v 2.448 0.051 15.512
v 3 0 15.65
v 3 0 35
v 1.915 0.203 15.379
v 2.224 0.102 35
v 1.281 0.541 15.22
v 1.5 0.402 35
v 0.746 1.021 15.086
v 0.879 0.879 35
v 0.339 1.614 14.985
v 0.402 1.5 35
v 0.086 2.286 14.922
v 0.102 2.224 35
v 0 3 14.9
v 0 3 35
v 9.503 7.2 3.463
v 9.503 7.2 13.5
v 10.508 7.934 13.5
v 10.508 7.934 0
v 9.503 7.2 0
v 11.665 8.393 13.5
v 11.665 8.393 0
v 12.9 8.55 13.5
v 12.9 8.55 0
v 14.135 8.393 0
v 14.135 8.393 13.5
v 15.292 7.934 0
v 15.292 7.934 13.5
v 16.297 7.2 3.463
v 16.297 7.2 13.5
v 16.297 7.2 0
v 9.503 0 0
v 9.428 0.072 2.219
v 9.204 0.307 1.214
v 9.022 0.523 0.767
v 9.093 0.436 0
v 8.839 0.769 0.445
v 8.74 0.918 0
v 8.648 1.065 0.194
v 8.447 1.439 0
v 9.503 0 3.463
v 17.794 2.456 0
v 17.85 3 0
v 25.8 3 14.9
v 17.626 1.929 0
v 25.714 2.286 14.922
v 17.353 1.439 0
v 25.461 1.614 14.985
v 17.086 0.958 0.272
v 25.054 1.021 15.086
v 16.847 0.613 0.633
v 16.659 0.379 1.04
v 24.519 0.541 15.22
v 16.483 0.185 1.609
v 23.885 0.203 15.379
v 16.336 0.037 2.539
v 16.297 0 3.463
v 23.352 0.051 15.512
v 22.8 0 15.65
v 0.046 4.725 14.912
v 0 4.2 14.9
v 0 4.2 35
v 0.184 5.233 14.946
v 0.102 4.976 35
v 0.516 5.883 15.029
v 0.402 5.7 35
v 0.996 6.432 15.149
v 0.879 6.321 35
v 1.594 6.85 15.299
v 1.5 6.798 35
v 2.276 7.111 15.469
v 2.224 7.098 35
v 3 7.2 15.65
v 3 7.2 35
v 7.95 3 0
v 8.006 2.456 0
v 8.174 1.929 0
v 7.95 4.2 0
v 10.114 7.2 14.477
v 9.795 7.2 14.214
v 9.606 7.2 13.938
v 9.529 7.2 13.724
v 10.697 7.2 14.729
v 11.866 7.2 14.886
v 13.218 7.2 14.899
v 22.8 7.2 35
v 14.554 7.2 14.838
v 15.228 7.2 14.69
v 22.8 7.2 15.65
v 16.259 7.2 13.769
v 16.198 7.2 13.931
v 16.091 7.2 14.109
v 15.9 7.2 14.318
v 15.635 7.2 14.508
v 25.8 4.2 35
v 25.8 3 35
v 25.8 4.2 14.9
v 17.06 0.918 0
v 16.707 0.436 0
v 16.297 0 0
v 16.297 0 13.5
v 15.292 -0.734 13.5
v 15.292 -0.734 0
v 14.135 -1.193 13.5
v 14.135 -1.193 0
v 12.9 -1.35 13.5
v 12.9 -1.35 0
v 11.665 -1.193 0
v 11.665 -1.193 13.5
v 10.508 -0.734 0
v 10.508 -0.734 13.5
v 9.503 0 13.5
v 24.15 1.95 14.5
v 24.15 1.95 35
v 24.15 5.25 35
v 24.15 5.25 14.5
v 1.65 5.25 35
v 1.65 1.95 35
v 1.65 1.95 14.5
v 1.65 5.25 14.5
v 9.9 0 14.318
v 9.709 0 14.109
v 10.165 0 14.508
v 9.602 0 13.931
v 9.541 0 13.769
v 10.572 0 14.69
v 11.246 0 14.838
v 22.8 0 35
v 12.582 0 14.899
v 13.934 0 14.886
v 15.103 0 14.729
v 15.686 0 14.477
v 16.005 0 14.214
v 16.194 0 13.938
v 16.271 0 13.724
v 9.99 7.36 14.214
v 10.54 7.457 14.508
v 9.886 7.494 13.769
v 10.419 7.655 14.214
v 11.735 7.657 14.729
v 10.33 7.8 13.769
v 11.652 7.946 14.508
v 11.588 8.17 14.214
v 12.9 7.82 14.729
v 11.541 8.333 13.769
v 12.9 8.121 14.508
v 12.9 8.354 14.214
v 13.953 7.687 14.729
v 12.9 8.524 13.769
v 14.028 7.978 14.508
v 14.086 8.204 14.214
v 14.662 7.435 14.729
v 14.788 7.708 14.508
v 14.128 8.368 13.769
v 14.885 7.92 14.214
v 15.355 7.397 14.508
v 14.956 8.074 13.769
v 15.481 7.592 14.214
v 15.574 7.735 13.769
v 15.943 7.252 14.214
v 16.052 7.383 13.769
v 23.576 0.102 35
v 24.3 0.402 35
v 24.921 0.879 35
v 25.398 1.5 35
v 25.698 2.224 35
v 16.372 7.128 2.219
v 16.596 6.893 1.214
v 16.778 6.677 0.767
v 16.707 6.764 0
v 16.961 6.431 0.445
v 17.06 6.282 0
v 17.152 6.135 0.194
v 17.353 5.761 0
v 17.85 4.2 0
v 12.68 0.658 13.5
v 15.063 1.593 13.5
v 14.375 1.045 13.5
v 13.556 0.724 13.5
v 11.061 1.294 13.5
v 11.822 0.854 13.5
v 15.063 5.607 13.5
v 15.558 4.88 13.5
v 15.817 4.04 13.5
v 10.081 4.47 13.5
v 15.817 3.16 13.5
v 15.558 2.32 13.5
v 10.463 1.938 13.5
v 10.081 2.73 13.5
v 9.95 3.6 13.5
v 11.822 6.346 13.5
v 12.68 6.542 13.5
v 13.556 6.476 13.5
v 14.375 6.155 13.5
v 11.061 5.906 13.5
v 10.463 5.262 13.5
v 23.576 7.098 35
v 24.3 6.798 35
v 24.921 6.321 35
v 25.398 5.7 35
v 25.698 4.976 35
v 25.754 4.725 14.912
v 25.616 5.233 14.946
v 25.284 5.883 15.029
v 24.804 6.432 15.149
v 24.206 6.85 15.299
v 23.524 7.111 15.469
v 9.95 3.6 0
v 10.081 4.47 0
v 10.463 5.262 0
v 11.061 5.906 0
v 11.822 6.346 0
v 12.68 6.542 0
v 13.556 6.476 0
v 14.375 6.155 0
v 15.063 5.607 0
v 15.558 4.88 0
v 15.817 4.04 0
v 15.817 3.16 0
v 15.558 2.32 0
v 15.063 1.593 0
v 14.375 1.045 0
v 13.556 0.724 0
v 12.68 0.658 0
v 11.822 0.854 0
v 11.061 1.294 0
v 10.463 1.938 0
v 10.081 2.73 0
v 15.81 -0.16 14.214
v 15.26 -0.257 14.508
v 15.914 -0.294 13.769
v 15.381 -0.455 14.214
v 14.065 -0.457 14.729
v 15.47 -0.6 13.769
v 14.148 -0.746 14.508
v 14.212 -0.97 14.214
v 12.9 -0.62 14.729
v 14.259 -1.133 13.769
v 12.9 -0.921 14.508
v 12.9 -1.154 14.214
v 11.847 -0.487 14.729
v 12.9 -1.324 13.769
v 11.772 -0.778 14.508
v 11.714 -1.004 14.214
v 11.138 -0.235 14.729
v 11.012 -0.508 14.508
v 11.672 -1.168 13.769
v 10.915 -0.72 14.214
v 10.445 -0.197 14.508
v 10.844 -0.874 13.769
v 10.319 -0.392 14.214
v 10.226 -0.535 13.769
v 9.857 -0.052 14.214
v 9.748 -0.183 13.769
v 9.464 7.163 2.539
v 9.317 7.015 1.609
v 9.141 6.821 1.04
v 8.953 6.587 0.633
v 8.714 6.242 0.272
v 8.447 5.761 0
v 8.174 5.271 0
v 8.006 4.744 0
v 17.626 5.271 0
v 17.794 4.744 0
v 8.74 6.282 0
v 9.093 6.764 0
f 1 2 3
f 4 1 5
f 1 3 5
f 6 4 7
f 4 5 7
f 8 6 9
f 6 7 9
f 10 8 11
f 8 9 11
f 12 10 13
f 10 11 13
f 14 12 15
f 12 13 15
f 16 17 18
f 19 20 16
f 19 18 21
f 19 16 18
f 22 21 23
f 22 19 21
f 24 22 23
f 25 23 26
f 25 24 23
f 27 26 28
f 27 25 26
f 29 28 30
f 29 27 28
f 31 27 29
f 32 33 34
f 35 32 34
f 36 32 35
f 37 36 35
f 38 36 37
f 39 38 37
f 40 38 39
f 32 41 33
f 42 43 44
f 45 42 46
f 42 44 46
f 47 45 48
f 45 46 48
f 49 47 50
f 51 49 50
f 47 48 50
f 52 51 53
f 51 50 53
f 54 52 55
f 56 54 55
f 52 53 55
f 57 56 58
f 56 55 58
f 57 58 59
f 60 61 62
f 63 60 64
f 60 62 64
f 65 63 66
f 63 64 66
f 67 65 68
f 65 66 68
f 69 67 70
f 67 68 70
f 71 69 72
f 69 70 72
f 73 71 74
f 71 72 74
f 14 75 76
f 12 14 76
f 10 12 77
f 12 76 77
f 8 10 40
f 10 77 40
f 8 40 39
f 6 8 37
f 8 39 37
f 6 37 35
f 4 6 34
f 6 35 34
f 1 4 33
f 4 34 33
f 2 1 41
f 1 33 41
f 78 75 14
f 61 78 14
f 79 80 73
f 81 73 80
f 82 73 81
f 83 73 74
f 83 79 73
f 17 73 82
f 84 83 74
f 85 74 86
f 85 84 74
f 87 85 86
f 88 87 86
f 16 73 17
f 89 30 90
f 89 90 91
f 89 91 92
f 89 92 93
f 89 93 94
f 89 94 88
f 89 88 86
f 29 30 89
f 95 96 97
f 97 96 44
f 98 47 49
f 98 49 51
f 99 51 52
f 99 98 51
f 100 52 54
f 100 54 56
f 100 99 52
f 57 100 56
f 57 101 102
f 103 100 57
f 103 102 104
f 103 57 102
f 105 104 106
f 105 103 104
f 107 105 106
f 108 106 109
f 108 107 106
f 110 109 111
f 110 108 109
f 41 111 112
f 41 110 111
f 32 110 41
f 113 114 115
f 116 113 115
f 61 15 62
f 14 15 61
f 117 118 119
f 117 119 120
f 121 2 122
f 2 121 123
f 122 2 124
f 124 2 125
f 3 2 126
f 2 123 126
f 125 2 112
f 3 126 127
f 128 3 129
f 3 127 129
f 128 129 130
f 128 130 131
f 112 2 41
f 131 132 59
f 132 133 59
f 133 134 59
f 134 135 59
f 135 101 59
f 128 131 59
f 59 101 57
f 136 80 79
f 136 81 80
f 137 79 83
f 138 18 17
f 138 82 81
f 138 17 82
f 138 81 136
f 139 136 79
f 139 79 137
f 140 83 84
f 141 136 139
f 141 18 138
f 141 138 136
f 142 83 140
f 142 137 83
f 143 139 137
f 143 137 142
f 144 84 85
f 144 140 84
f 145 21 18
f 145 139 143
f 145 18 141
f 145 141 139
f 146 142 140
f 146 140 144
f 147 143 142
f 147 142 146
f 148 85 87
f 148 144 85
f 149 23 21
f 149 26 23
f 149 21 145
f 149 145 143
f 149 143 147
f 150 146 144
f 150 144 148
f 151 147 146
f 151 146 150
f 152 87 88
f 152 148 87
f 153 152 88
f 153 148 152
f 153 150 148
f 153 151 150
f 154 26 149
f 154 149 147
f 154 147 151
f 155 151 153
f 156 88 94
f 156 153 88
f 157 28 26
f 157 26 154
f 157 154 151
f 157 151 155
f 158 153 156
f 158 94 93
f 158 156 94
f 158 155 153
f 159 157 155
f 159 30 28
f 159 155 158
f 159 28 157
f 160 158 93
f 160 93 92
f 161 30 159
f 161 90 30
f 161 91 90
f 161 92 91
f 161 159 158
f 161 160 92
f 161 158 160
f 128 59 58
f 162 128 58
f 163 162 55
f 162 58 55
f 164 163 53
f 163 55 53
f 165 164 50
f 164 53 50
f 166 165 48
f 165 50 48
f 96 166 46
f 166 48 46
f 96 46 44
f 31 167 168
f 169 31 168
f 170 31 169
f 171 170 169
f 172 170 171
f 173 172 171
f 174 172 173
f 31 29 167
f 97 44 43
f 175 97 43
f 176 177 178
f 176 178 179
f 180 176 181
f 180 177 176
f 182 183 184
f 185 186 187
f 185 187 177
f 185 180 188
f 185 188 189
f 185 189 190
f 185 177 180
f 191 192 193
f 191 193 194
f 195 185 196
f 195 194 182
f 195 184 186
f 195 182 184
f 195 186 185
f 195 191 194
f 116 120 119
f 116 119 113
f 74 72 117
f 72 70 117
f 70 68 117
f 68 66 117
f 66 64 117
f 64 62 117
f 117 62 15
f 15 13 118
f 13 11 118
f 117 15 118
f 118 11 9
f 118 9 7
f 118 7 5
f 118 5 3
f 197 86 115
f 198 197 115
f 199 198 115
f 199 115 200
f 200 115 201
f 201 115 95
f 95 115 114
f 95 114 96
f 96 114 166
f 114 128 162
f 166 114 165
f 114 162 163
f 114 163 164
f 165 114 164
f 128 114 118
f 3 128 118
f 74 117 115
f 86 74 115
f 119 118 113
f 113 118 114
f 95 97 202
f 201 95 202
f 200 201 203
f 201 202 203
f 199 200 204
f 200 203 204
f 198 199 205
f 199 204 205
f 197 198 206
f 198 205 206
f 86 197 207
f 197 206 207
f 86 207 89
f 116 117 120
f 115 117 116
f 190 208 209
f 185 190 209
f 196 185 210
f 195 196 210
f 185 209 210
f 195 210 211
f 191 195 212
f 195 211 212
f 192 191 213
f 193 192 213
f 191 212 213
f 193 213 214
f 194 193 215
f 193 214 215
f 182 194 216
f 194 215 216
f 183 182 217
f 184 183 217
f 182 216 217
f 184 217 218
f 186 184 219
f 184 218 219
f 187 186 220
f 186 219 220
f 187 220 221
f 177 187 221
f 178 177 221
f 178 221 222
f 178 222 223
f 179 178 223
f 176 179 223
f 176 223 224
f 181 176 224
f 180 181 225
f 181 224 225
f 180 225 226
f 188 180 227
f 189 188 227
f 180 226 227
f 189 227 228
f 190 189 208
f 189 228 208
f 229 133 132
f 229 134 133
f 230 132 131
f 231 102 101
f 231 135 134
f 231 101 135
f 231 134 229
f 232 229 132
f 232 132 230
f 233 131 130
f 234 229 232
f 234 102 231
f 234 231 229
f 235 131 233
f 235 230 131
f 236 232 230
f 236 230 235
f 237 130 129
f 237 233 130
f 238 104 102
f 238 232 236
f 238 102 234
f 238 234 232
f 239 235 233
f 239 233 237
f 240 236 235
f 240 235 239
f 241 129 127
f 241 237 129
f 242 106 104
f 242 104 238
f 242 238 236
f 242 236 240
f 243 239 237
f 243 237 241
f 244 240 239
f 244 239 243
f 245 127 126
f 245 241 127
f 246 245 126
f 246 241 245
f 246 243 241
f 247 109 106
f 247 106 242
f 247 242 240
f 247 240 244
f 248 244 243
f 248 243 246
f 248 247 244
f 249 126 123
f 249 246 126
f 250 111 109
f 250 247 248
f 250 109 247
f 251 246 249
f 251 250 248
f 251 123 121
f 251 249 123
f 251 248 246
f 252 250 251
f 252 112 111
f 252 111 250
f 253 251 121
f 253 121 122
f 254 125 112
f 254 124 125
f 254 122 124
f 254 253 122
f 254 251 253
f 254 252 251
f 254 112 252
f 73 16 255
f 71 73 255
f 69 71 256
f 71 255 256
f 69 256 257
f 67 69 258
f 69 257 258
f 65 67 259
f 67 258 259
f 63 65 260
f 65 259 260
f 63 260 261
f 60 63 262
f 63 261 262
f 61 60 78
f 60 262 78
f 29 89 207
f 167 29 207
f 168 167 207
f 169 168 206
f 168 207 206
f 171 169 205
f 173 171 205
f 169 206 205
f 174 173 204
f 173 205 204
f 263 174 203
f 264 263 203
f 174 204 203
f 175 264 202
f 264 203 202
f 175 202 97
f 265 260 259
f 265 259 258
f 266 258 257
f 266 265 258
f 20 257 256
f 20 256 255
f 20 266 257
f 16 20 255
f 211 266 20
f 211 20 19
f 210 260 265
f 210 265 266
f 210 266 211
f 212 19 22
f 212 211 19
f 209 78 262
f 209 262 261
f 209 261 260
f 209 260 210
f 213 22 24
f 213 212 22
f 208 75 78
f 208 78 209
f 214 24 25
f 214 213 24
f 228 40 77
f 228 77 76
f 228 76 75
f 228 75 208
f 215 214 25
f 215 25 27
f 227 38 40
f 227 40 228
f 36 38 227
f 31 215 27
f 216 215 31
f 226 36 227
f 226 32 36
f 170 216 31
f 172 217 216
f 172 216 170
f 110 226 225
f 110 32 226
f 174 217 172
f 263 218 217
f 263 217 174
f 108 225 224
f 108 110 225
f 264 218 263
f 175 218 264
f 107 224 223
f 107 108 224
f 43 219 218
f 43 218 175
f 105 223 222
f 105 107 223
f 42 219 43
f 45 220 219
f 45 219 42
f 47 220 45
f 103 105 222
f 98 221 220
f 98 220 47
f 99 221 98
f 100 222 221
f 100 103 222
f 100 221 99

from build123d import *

# Parameters (mm, degrees)
SKETCH1_W           = 25.8
SKETCH1_H           = 35
BOSS_EXTRUDE1_DEPTH = 7.2
SKETCH3_W           = 22.5
SKETCH3_H           = 3.3
CUT_EXTRUDE1_DEPTH  = 20.5
BOSS_EXTRUDE2_DEPTH = 14.9
SKETCH6_R           = 2.95
CUT_EXTRUDE3_DEPTH  = 13.5
FILLET1_R           = 1.4
FILLET2_R           = 1.4
CUT_EXTRUDE4_DEPTH  = 13.5
FILLET5_R           = 3


with BuildPart() as part:
    # Sketch1 → Boss-Extrude1 (new body)
    with BuildSketch(Plane(origin=(0, 0, 0), x_dir=(1, 0, 0), z_dir=(0, 1, 0))):
        with Locations((12.9, -17.5)):
            Rectangle(SKETCH1_W, SKETCH1_H)
    extrude(amount=BOSS_EXTRUDE1_DEPTH)

    # Sketch3 → Cut-Extrude1 (cut)
    with BuildSketch(Plane.XY.offset(35)):
        with Locations((12.9, 3.6)):
            Rectangle(SKETCH3_W, SKETCH3_H)
    extrude(amount=-CUT_EXTRUDE1_DEPTH, mode=Mode.SUBTRACT)

    # Sketch5 → Boss-Extrude2 (add)
    with BuildSketch(Plane(origin=(0, 0, 0), x_dir=(-1, 0, 0), z_dir=(0, 0, -1))):
        with BuildLine():
            Line((-16.297425496, 7.2), (-12.9, 7.2))
            Line((-12.9, 7.2), (-9.502574504, 7.2))
            ThreePointArc((-9.502574504, 7.2), (-12.9, 8.55), (-16.297425496, 7.2))
        make_face()
        with BuildLine():
            Line((-9.502574504, 0), (-12.9, 0))
            Line((-12.9, 0), (-16.297425496, 0))
            ThreePointArc((-16.297425496, 0), (-12.9, -1.35), (-9.502574504, 0))
        make_face()
    extrude(amount=-BOSS_EXTRUDE2_DEPTH)

    # Sketch6 → Cut-Extrude3 (cut)
    with BuildSketch(Plane(origin=(0, 0, 0), x_dir=(-1, 0, 0), z_dir=(0, 0, -1))):
        with Locations((-12.9, 3.6)):
            Circle(SKETCH6_R)
    extrude(amount=-CUT_EXTRUDE3_DEPTH, mode=Mode.SUBTRACT)

    # Fillet1
    # the kernel refuses this fillet: 1.4 mm, written as the material it takes off along each edge
    with BuildSketch(Plane(origin=(12.9, 3.6, 14.9), x_dir=(-0.9942803452588228, 0.10680166212187986, 0), z_dir=(-0.10680166212187986, -0.9942803452588228, 0))) as fillet1_piece_1_section:
        with BuildLine():
            CenterArc((4.95 - FILLET1_R, FILLET1_R), FILLET1_R, 270, 90)
            Line((4.95 - FILLET1_R, 0), (4.95, 0))
            Line((4.95, 0), (4.95, FILLET1_R))
        make_face()
    fillet1_piece_1 = revolve(axis=Axis((12.9, 3.6, 14.9), (0, 0, -1)), revolution_arc=167.738044053, mode=Mode.PRIVATE)
    fillet1_piece_1 = split(fillet1_piece_1, bisect_by=Plane(origin=(12.9, 7.2, 14.482271144), z_dir=(0, 1, 0)), keep=Keep.TOP, mode=Mode.PRIVATE)
    add(fillet1_piece_1, mode=Mode.SUBTRACT)

    # Fillet2
    # the kernel refuses this fillet: 1.4 mm, written as the material it takes off along each edge
    with BuildSketch(Plane(origin=(12.9, 3.6, 14.9), x_dir=(0.9942803452588191, -0.10680166212191289, 0), z_dir=(0.10680166212191289, 0.9942803452588191, 0))) as fillet2_piece_1_section:
        with BuildLine():
            CenterArc((4.95 - FILLET2_R, FILLET2_R), FILLET2_R, 270, 90)
            Line((4.95 - FILLET2_R, 0), (4.95, 0))
            Line((4.95, 0), (4.95, FILLET2_R))
        make_face()
    fillet2_piece_1 = revolve(axis=Axis((12.9, 3.6, 14.9), (0, 0, -1)), revolution_arc=167.738044053, mode=Mode.PRIVATE)
    fillet2_piece_1 = split(fillet2_piece_1, bisect_by=Plane(origin=(12.9, 0, 14.482271144), z_dir=(0, -1, 0)), keep=Keep.TOP, mode=Mode.PRIVATE)
    add(fillet2_piece_1, mode=Mode.SUBTRACT)

    # Sketch7 → Cut-Extrude4 (cut)
    with BuildSketch(Plane(origin=(0, 0, 0), x_dir=(-1, 0, 0), z_dir=(0, -1, 0))):
        Polygon((-17.85, 0), (-25.8, 0), (-25.8, -14.9), align=None)
        Polygon((0, -14.9), (0, 0), (-7.95, 0), align=None)
    extrude(amount=-CUT_EXTRUDE4_DEPTH, mode=Mode.SUBTRACT)

    # Fillet5
    # the kernel refuses this fillet: 3 mm, written as the material it takes off along each edge
    with BuildSketch(Plane(origin=(25.8, 7.2, 7.4), x_dir=(-1, 0, 0), z_dir=(0, 0, 1)), Plane(origin=(0, 7.2, 42.5), x_dir=(1, 0, 0), z_dir=(0, 0, -1))) as fillet5_piece_1:
        with BuildLine():
            CenterArc((FILLET5_R, FILLET5_R), FILLET5_R, 180, 90)
            Line((0, FILLET5_R), (0, 0))
            Line((0, 0), (FILLET5_R, 0))
        make_face()
    extrude(amount=35.1, mode=Mode.SUBTRACT)
    with BuildSketch(Plane(origin=(25.8, 0, 7.4), x_dir=(-1, 0, 0), z_dir=(0, 0, 1)), Plane(origin=(0, 0, 42.5), x_dir=(1, 0, 0), z_dir=(0, 0, -1))) as fillet5_piece_2:
        with BuildLine():
            CenterArc((FILLET5_R, -FILLET5_R), FILLET5_R, 90, 90)
            Line((0, -FILLET5_R), (0, 0))
            Line((0, 0), (FILLET5_R, 0))
        make_face()
    extrude(amount=35.1, mode=Mode.SUBTRACT)
    with BuildSketch(Plane(origin=(29.33056421, 7.2, 21.517032293), x_dir=(0, -1, 0), z_dir=(-0.4707418946375641, 0, -0.8822709723395848))) as fillet5_piece_3_section:
        with BuildLine():
            CenterArc((FILLET5_R, FILLET5_R), FILLET5_R, 180, 90)
            Line((0, FILLET5_R), (0, 0))
            Line((0, 0), (FILLET5_R, 0))
        make_face()
    fillet5_piece_3 = extrude(amount=31.88823555, mode=Mode.PRIVATE)
    fillet5_piece_3 = fillet5_piece_3 - Plane(origin=(12.9, 3.6, 8.289630093), x_dir=(-0.6863485850246219, 0.7272727272727194, 0), z_dir=(0, 0, -1)) * Cylinder(4.95, 76, mode=Mode.PRIVATE)
    add(fillet5_piece_3, mode=Mode.SUBTRACT)
    with BuildSketch(Plane(origin=(29.33056421, 0, 21.517032293), x_dir=(-0.8822709723395848, 0, 0.4707418946375641), z_dir=(-0.4707418946375641, 0, -0.8822709723395848))) as fillet5_piece_4_section:
        with BuildLine():
            CenterArc((FILLET5_R, FILLET5_R), FILLET5_R, 180, 90)
            Line((0, FILLET5_R), (0, 0))
            Line((0, 0), (FILLET5_R, 0))
        make_face()
    fillet5_piece_4 = extrude(amount=31.88823555, mode=Mode.PRIVATE)
    fillet5_piece_4 = fillet5_piece_4 - Plane(origin=(12.9, 3.6, 8.289627813), x_dir=(0.6863485850245981, -0.727272727272742, 0), z_dir=(0, 0, -1)) * Cylinder(4.95, 76, mode=Mode.PRIVATE)
    add(fillet5_piece_4, mode=Mode.SUBTRACT)
    with BuildSketch(Plane(origin=(11.48056421, 7.2, -6.617032293), x_dir=(0.8822709723395851, 0, 0.4707418946375639), z_dir=(-0.4707418946375639, 0, 0.882270972339585))) as fillet5_piece_5_section:
        with BuildLine():
            CenterArc((FILLET5_R, -FILLET5_R), FILLET5_R, 90, 90)
            Line((0, -FILLET5_R), (0, 0))
            Line((0, 0), (FILLET5_R, 0))
        make_face()
    fillet5_piece_5 = extrude(amount=31.88823555, mode=Mode.PRIVATE)
    fillet5_piece_5 = fillet5_piece_5 - Plane(origin=(12.9, 3.6, 8.289627632), x_dir=(-0.6863485850246219, 0.7272727272727194, 0), z_dir=(0, 0, -1)) * Cylinder(4.95, 76, mode=Mode.PRIVATE)
    add(fillet5_piece_5, mode=Mode.SUBTRACT)
    with BuildSketch(Plane(origin=(11.48056421, 0, -6.617032293), x_dir=(0.8822709723395851, 0, 0.4707418946375639), z_dir=(-0.4707418946375639, 0, 0.882270972339585))) as fillet5_piece_6_section:
        with BuildLine():
            CenterArc((FILLET5_R, FILLET5_R), FILLET5_R, 180, 90)
            Line((0, FILLET5_R), (0, 0))
            Line((0, 0), (FILLET5_R, 0))
        make_face()
    fillet5_piece_6 = extrude(amount=31.88823555, mode=Mode.PRIVATE)
    fillet5_piece_6 = fillet5_piece_6 - Plane(origin=(12.9, 3.6, 8.289629174), x_dir=(0.6863485850245981, -0.727272727272742, 0), z_dir=(0, 0, -1)) * Cylinder(4.95, 76, mode=Mode.PRIVATE)
    add(fillet5_piece_6, mode=Mode.SUBTRACT)


solid = part.part
